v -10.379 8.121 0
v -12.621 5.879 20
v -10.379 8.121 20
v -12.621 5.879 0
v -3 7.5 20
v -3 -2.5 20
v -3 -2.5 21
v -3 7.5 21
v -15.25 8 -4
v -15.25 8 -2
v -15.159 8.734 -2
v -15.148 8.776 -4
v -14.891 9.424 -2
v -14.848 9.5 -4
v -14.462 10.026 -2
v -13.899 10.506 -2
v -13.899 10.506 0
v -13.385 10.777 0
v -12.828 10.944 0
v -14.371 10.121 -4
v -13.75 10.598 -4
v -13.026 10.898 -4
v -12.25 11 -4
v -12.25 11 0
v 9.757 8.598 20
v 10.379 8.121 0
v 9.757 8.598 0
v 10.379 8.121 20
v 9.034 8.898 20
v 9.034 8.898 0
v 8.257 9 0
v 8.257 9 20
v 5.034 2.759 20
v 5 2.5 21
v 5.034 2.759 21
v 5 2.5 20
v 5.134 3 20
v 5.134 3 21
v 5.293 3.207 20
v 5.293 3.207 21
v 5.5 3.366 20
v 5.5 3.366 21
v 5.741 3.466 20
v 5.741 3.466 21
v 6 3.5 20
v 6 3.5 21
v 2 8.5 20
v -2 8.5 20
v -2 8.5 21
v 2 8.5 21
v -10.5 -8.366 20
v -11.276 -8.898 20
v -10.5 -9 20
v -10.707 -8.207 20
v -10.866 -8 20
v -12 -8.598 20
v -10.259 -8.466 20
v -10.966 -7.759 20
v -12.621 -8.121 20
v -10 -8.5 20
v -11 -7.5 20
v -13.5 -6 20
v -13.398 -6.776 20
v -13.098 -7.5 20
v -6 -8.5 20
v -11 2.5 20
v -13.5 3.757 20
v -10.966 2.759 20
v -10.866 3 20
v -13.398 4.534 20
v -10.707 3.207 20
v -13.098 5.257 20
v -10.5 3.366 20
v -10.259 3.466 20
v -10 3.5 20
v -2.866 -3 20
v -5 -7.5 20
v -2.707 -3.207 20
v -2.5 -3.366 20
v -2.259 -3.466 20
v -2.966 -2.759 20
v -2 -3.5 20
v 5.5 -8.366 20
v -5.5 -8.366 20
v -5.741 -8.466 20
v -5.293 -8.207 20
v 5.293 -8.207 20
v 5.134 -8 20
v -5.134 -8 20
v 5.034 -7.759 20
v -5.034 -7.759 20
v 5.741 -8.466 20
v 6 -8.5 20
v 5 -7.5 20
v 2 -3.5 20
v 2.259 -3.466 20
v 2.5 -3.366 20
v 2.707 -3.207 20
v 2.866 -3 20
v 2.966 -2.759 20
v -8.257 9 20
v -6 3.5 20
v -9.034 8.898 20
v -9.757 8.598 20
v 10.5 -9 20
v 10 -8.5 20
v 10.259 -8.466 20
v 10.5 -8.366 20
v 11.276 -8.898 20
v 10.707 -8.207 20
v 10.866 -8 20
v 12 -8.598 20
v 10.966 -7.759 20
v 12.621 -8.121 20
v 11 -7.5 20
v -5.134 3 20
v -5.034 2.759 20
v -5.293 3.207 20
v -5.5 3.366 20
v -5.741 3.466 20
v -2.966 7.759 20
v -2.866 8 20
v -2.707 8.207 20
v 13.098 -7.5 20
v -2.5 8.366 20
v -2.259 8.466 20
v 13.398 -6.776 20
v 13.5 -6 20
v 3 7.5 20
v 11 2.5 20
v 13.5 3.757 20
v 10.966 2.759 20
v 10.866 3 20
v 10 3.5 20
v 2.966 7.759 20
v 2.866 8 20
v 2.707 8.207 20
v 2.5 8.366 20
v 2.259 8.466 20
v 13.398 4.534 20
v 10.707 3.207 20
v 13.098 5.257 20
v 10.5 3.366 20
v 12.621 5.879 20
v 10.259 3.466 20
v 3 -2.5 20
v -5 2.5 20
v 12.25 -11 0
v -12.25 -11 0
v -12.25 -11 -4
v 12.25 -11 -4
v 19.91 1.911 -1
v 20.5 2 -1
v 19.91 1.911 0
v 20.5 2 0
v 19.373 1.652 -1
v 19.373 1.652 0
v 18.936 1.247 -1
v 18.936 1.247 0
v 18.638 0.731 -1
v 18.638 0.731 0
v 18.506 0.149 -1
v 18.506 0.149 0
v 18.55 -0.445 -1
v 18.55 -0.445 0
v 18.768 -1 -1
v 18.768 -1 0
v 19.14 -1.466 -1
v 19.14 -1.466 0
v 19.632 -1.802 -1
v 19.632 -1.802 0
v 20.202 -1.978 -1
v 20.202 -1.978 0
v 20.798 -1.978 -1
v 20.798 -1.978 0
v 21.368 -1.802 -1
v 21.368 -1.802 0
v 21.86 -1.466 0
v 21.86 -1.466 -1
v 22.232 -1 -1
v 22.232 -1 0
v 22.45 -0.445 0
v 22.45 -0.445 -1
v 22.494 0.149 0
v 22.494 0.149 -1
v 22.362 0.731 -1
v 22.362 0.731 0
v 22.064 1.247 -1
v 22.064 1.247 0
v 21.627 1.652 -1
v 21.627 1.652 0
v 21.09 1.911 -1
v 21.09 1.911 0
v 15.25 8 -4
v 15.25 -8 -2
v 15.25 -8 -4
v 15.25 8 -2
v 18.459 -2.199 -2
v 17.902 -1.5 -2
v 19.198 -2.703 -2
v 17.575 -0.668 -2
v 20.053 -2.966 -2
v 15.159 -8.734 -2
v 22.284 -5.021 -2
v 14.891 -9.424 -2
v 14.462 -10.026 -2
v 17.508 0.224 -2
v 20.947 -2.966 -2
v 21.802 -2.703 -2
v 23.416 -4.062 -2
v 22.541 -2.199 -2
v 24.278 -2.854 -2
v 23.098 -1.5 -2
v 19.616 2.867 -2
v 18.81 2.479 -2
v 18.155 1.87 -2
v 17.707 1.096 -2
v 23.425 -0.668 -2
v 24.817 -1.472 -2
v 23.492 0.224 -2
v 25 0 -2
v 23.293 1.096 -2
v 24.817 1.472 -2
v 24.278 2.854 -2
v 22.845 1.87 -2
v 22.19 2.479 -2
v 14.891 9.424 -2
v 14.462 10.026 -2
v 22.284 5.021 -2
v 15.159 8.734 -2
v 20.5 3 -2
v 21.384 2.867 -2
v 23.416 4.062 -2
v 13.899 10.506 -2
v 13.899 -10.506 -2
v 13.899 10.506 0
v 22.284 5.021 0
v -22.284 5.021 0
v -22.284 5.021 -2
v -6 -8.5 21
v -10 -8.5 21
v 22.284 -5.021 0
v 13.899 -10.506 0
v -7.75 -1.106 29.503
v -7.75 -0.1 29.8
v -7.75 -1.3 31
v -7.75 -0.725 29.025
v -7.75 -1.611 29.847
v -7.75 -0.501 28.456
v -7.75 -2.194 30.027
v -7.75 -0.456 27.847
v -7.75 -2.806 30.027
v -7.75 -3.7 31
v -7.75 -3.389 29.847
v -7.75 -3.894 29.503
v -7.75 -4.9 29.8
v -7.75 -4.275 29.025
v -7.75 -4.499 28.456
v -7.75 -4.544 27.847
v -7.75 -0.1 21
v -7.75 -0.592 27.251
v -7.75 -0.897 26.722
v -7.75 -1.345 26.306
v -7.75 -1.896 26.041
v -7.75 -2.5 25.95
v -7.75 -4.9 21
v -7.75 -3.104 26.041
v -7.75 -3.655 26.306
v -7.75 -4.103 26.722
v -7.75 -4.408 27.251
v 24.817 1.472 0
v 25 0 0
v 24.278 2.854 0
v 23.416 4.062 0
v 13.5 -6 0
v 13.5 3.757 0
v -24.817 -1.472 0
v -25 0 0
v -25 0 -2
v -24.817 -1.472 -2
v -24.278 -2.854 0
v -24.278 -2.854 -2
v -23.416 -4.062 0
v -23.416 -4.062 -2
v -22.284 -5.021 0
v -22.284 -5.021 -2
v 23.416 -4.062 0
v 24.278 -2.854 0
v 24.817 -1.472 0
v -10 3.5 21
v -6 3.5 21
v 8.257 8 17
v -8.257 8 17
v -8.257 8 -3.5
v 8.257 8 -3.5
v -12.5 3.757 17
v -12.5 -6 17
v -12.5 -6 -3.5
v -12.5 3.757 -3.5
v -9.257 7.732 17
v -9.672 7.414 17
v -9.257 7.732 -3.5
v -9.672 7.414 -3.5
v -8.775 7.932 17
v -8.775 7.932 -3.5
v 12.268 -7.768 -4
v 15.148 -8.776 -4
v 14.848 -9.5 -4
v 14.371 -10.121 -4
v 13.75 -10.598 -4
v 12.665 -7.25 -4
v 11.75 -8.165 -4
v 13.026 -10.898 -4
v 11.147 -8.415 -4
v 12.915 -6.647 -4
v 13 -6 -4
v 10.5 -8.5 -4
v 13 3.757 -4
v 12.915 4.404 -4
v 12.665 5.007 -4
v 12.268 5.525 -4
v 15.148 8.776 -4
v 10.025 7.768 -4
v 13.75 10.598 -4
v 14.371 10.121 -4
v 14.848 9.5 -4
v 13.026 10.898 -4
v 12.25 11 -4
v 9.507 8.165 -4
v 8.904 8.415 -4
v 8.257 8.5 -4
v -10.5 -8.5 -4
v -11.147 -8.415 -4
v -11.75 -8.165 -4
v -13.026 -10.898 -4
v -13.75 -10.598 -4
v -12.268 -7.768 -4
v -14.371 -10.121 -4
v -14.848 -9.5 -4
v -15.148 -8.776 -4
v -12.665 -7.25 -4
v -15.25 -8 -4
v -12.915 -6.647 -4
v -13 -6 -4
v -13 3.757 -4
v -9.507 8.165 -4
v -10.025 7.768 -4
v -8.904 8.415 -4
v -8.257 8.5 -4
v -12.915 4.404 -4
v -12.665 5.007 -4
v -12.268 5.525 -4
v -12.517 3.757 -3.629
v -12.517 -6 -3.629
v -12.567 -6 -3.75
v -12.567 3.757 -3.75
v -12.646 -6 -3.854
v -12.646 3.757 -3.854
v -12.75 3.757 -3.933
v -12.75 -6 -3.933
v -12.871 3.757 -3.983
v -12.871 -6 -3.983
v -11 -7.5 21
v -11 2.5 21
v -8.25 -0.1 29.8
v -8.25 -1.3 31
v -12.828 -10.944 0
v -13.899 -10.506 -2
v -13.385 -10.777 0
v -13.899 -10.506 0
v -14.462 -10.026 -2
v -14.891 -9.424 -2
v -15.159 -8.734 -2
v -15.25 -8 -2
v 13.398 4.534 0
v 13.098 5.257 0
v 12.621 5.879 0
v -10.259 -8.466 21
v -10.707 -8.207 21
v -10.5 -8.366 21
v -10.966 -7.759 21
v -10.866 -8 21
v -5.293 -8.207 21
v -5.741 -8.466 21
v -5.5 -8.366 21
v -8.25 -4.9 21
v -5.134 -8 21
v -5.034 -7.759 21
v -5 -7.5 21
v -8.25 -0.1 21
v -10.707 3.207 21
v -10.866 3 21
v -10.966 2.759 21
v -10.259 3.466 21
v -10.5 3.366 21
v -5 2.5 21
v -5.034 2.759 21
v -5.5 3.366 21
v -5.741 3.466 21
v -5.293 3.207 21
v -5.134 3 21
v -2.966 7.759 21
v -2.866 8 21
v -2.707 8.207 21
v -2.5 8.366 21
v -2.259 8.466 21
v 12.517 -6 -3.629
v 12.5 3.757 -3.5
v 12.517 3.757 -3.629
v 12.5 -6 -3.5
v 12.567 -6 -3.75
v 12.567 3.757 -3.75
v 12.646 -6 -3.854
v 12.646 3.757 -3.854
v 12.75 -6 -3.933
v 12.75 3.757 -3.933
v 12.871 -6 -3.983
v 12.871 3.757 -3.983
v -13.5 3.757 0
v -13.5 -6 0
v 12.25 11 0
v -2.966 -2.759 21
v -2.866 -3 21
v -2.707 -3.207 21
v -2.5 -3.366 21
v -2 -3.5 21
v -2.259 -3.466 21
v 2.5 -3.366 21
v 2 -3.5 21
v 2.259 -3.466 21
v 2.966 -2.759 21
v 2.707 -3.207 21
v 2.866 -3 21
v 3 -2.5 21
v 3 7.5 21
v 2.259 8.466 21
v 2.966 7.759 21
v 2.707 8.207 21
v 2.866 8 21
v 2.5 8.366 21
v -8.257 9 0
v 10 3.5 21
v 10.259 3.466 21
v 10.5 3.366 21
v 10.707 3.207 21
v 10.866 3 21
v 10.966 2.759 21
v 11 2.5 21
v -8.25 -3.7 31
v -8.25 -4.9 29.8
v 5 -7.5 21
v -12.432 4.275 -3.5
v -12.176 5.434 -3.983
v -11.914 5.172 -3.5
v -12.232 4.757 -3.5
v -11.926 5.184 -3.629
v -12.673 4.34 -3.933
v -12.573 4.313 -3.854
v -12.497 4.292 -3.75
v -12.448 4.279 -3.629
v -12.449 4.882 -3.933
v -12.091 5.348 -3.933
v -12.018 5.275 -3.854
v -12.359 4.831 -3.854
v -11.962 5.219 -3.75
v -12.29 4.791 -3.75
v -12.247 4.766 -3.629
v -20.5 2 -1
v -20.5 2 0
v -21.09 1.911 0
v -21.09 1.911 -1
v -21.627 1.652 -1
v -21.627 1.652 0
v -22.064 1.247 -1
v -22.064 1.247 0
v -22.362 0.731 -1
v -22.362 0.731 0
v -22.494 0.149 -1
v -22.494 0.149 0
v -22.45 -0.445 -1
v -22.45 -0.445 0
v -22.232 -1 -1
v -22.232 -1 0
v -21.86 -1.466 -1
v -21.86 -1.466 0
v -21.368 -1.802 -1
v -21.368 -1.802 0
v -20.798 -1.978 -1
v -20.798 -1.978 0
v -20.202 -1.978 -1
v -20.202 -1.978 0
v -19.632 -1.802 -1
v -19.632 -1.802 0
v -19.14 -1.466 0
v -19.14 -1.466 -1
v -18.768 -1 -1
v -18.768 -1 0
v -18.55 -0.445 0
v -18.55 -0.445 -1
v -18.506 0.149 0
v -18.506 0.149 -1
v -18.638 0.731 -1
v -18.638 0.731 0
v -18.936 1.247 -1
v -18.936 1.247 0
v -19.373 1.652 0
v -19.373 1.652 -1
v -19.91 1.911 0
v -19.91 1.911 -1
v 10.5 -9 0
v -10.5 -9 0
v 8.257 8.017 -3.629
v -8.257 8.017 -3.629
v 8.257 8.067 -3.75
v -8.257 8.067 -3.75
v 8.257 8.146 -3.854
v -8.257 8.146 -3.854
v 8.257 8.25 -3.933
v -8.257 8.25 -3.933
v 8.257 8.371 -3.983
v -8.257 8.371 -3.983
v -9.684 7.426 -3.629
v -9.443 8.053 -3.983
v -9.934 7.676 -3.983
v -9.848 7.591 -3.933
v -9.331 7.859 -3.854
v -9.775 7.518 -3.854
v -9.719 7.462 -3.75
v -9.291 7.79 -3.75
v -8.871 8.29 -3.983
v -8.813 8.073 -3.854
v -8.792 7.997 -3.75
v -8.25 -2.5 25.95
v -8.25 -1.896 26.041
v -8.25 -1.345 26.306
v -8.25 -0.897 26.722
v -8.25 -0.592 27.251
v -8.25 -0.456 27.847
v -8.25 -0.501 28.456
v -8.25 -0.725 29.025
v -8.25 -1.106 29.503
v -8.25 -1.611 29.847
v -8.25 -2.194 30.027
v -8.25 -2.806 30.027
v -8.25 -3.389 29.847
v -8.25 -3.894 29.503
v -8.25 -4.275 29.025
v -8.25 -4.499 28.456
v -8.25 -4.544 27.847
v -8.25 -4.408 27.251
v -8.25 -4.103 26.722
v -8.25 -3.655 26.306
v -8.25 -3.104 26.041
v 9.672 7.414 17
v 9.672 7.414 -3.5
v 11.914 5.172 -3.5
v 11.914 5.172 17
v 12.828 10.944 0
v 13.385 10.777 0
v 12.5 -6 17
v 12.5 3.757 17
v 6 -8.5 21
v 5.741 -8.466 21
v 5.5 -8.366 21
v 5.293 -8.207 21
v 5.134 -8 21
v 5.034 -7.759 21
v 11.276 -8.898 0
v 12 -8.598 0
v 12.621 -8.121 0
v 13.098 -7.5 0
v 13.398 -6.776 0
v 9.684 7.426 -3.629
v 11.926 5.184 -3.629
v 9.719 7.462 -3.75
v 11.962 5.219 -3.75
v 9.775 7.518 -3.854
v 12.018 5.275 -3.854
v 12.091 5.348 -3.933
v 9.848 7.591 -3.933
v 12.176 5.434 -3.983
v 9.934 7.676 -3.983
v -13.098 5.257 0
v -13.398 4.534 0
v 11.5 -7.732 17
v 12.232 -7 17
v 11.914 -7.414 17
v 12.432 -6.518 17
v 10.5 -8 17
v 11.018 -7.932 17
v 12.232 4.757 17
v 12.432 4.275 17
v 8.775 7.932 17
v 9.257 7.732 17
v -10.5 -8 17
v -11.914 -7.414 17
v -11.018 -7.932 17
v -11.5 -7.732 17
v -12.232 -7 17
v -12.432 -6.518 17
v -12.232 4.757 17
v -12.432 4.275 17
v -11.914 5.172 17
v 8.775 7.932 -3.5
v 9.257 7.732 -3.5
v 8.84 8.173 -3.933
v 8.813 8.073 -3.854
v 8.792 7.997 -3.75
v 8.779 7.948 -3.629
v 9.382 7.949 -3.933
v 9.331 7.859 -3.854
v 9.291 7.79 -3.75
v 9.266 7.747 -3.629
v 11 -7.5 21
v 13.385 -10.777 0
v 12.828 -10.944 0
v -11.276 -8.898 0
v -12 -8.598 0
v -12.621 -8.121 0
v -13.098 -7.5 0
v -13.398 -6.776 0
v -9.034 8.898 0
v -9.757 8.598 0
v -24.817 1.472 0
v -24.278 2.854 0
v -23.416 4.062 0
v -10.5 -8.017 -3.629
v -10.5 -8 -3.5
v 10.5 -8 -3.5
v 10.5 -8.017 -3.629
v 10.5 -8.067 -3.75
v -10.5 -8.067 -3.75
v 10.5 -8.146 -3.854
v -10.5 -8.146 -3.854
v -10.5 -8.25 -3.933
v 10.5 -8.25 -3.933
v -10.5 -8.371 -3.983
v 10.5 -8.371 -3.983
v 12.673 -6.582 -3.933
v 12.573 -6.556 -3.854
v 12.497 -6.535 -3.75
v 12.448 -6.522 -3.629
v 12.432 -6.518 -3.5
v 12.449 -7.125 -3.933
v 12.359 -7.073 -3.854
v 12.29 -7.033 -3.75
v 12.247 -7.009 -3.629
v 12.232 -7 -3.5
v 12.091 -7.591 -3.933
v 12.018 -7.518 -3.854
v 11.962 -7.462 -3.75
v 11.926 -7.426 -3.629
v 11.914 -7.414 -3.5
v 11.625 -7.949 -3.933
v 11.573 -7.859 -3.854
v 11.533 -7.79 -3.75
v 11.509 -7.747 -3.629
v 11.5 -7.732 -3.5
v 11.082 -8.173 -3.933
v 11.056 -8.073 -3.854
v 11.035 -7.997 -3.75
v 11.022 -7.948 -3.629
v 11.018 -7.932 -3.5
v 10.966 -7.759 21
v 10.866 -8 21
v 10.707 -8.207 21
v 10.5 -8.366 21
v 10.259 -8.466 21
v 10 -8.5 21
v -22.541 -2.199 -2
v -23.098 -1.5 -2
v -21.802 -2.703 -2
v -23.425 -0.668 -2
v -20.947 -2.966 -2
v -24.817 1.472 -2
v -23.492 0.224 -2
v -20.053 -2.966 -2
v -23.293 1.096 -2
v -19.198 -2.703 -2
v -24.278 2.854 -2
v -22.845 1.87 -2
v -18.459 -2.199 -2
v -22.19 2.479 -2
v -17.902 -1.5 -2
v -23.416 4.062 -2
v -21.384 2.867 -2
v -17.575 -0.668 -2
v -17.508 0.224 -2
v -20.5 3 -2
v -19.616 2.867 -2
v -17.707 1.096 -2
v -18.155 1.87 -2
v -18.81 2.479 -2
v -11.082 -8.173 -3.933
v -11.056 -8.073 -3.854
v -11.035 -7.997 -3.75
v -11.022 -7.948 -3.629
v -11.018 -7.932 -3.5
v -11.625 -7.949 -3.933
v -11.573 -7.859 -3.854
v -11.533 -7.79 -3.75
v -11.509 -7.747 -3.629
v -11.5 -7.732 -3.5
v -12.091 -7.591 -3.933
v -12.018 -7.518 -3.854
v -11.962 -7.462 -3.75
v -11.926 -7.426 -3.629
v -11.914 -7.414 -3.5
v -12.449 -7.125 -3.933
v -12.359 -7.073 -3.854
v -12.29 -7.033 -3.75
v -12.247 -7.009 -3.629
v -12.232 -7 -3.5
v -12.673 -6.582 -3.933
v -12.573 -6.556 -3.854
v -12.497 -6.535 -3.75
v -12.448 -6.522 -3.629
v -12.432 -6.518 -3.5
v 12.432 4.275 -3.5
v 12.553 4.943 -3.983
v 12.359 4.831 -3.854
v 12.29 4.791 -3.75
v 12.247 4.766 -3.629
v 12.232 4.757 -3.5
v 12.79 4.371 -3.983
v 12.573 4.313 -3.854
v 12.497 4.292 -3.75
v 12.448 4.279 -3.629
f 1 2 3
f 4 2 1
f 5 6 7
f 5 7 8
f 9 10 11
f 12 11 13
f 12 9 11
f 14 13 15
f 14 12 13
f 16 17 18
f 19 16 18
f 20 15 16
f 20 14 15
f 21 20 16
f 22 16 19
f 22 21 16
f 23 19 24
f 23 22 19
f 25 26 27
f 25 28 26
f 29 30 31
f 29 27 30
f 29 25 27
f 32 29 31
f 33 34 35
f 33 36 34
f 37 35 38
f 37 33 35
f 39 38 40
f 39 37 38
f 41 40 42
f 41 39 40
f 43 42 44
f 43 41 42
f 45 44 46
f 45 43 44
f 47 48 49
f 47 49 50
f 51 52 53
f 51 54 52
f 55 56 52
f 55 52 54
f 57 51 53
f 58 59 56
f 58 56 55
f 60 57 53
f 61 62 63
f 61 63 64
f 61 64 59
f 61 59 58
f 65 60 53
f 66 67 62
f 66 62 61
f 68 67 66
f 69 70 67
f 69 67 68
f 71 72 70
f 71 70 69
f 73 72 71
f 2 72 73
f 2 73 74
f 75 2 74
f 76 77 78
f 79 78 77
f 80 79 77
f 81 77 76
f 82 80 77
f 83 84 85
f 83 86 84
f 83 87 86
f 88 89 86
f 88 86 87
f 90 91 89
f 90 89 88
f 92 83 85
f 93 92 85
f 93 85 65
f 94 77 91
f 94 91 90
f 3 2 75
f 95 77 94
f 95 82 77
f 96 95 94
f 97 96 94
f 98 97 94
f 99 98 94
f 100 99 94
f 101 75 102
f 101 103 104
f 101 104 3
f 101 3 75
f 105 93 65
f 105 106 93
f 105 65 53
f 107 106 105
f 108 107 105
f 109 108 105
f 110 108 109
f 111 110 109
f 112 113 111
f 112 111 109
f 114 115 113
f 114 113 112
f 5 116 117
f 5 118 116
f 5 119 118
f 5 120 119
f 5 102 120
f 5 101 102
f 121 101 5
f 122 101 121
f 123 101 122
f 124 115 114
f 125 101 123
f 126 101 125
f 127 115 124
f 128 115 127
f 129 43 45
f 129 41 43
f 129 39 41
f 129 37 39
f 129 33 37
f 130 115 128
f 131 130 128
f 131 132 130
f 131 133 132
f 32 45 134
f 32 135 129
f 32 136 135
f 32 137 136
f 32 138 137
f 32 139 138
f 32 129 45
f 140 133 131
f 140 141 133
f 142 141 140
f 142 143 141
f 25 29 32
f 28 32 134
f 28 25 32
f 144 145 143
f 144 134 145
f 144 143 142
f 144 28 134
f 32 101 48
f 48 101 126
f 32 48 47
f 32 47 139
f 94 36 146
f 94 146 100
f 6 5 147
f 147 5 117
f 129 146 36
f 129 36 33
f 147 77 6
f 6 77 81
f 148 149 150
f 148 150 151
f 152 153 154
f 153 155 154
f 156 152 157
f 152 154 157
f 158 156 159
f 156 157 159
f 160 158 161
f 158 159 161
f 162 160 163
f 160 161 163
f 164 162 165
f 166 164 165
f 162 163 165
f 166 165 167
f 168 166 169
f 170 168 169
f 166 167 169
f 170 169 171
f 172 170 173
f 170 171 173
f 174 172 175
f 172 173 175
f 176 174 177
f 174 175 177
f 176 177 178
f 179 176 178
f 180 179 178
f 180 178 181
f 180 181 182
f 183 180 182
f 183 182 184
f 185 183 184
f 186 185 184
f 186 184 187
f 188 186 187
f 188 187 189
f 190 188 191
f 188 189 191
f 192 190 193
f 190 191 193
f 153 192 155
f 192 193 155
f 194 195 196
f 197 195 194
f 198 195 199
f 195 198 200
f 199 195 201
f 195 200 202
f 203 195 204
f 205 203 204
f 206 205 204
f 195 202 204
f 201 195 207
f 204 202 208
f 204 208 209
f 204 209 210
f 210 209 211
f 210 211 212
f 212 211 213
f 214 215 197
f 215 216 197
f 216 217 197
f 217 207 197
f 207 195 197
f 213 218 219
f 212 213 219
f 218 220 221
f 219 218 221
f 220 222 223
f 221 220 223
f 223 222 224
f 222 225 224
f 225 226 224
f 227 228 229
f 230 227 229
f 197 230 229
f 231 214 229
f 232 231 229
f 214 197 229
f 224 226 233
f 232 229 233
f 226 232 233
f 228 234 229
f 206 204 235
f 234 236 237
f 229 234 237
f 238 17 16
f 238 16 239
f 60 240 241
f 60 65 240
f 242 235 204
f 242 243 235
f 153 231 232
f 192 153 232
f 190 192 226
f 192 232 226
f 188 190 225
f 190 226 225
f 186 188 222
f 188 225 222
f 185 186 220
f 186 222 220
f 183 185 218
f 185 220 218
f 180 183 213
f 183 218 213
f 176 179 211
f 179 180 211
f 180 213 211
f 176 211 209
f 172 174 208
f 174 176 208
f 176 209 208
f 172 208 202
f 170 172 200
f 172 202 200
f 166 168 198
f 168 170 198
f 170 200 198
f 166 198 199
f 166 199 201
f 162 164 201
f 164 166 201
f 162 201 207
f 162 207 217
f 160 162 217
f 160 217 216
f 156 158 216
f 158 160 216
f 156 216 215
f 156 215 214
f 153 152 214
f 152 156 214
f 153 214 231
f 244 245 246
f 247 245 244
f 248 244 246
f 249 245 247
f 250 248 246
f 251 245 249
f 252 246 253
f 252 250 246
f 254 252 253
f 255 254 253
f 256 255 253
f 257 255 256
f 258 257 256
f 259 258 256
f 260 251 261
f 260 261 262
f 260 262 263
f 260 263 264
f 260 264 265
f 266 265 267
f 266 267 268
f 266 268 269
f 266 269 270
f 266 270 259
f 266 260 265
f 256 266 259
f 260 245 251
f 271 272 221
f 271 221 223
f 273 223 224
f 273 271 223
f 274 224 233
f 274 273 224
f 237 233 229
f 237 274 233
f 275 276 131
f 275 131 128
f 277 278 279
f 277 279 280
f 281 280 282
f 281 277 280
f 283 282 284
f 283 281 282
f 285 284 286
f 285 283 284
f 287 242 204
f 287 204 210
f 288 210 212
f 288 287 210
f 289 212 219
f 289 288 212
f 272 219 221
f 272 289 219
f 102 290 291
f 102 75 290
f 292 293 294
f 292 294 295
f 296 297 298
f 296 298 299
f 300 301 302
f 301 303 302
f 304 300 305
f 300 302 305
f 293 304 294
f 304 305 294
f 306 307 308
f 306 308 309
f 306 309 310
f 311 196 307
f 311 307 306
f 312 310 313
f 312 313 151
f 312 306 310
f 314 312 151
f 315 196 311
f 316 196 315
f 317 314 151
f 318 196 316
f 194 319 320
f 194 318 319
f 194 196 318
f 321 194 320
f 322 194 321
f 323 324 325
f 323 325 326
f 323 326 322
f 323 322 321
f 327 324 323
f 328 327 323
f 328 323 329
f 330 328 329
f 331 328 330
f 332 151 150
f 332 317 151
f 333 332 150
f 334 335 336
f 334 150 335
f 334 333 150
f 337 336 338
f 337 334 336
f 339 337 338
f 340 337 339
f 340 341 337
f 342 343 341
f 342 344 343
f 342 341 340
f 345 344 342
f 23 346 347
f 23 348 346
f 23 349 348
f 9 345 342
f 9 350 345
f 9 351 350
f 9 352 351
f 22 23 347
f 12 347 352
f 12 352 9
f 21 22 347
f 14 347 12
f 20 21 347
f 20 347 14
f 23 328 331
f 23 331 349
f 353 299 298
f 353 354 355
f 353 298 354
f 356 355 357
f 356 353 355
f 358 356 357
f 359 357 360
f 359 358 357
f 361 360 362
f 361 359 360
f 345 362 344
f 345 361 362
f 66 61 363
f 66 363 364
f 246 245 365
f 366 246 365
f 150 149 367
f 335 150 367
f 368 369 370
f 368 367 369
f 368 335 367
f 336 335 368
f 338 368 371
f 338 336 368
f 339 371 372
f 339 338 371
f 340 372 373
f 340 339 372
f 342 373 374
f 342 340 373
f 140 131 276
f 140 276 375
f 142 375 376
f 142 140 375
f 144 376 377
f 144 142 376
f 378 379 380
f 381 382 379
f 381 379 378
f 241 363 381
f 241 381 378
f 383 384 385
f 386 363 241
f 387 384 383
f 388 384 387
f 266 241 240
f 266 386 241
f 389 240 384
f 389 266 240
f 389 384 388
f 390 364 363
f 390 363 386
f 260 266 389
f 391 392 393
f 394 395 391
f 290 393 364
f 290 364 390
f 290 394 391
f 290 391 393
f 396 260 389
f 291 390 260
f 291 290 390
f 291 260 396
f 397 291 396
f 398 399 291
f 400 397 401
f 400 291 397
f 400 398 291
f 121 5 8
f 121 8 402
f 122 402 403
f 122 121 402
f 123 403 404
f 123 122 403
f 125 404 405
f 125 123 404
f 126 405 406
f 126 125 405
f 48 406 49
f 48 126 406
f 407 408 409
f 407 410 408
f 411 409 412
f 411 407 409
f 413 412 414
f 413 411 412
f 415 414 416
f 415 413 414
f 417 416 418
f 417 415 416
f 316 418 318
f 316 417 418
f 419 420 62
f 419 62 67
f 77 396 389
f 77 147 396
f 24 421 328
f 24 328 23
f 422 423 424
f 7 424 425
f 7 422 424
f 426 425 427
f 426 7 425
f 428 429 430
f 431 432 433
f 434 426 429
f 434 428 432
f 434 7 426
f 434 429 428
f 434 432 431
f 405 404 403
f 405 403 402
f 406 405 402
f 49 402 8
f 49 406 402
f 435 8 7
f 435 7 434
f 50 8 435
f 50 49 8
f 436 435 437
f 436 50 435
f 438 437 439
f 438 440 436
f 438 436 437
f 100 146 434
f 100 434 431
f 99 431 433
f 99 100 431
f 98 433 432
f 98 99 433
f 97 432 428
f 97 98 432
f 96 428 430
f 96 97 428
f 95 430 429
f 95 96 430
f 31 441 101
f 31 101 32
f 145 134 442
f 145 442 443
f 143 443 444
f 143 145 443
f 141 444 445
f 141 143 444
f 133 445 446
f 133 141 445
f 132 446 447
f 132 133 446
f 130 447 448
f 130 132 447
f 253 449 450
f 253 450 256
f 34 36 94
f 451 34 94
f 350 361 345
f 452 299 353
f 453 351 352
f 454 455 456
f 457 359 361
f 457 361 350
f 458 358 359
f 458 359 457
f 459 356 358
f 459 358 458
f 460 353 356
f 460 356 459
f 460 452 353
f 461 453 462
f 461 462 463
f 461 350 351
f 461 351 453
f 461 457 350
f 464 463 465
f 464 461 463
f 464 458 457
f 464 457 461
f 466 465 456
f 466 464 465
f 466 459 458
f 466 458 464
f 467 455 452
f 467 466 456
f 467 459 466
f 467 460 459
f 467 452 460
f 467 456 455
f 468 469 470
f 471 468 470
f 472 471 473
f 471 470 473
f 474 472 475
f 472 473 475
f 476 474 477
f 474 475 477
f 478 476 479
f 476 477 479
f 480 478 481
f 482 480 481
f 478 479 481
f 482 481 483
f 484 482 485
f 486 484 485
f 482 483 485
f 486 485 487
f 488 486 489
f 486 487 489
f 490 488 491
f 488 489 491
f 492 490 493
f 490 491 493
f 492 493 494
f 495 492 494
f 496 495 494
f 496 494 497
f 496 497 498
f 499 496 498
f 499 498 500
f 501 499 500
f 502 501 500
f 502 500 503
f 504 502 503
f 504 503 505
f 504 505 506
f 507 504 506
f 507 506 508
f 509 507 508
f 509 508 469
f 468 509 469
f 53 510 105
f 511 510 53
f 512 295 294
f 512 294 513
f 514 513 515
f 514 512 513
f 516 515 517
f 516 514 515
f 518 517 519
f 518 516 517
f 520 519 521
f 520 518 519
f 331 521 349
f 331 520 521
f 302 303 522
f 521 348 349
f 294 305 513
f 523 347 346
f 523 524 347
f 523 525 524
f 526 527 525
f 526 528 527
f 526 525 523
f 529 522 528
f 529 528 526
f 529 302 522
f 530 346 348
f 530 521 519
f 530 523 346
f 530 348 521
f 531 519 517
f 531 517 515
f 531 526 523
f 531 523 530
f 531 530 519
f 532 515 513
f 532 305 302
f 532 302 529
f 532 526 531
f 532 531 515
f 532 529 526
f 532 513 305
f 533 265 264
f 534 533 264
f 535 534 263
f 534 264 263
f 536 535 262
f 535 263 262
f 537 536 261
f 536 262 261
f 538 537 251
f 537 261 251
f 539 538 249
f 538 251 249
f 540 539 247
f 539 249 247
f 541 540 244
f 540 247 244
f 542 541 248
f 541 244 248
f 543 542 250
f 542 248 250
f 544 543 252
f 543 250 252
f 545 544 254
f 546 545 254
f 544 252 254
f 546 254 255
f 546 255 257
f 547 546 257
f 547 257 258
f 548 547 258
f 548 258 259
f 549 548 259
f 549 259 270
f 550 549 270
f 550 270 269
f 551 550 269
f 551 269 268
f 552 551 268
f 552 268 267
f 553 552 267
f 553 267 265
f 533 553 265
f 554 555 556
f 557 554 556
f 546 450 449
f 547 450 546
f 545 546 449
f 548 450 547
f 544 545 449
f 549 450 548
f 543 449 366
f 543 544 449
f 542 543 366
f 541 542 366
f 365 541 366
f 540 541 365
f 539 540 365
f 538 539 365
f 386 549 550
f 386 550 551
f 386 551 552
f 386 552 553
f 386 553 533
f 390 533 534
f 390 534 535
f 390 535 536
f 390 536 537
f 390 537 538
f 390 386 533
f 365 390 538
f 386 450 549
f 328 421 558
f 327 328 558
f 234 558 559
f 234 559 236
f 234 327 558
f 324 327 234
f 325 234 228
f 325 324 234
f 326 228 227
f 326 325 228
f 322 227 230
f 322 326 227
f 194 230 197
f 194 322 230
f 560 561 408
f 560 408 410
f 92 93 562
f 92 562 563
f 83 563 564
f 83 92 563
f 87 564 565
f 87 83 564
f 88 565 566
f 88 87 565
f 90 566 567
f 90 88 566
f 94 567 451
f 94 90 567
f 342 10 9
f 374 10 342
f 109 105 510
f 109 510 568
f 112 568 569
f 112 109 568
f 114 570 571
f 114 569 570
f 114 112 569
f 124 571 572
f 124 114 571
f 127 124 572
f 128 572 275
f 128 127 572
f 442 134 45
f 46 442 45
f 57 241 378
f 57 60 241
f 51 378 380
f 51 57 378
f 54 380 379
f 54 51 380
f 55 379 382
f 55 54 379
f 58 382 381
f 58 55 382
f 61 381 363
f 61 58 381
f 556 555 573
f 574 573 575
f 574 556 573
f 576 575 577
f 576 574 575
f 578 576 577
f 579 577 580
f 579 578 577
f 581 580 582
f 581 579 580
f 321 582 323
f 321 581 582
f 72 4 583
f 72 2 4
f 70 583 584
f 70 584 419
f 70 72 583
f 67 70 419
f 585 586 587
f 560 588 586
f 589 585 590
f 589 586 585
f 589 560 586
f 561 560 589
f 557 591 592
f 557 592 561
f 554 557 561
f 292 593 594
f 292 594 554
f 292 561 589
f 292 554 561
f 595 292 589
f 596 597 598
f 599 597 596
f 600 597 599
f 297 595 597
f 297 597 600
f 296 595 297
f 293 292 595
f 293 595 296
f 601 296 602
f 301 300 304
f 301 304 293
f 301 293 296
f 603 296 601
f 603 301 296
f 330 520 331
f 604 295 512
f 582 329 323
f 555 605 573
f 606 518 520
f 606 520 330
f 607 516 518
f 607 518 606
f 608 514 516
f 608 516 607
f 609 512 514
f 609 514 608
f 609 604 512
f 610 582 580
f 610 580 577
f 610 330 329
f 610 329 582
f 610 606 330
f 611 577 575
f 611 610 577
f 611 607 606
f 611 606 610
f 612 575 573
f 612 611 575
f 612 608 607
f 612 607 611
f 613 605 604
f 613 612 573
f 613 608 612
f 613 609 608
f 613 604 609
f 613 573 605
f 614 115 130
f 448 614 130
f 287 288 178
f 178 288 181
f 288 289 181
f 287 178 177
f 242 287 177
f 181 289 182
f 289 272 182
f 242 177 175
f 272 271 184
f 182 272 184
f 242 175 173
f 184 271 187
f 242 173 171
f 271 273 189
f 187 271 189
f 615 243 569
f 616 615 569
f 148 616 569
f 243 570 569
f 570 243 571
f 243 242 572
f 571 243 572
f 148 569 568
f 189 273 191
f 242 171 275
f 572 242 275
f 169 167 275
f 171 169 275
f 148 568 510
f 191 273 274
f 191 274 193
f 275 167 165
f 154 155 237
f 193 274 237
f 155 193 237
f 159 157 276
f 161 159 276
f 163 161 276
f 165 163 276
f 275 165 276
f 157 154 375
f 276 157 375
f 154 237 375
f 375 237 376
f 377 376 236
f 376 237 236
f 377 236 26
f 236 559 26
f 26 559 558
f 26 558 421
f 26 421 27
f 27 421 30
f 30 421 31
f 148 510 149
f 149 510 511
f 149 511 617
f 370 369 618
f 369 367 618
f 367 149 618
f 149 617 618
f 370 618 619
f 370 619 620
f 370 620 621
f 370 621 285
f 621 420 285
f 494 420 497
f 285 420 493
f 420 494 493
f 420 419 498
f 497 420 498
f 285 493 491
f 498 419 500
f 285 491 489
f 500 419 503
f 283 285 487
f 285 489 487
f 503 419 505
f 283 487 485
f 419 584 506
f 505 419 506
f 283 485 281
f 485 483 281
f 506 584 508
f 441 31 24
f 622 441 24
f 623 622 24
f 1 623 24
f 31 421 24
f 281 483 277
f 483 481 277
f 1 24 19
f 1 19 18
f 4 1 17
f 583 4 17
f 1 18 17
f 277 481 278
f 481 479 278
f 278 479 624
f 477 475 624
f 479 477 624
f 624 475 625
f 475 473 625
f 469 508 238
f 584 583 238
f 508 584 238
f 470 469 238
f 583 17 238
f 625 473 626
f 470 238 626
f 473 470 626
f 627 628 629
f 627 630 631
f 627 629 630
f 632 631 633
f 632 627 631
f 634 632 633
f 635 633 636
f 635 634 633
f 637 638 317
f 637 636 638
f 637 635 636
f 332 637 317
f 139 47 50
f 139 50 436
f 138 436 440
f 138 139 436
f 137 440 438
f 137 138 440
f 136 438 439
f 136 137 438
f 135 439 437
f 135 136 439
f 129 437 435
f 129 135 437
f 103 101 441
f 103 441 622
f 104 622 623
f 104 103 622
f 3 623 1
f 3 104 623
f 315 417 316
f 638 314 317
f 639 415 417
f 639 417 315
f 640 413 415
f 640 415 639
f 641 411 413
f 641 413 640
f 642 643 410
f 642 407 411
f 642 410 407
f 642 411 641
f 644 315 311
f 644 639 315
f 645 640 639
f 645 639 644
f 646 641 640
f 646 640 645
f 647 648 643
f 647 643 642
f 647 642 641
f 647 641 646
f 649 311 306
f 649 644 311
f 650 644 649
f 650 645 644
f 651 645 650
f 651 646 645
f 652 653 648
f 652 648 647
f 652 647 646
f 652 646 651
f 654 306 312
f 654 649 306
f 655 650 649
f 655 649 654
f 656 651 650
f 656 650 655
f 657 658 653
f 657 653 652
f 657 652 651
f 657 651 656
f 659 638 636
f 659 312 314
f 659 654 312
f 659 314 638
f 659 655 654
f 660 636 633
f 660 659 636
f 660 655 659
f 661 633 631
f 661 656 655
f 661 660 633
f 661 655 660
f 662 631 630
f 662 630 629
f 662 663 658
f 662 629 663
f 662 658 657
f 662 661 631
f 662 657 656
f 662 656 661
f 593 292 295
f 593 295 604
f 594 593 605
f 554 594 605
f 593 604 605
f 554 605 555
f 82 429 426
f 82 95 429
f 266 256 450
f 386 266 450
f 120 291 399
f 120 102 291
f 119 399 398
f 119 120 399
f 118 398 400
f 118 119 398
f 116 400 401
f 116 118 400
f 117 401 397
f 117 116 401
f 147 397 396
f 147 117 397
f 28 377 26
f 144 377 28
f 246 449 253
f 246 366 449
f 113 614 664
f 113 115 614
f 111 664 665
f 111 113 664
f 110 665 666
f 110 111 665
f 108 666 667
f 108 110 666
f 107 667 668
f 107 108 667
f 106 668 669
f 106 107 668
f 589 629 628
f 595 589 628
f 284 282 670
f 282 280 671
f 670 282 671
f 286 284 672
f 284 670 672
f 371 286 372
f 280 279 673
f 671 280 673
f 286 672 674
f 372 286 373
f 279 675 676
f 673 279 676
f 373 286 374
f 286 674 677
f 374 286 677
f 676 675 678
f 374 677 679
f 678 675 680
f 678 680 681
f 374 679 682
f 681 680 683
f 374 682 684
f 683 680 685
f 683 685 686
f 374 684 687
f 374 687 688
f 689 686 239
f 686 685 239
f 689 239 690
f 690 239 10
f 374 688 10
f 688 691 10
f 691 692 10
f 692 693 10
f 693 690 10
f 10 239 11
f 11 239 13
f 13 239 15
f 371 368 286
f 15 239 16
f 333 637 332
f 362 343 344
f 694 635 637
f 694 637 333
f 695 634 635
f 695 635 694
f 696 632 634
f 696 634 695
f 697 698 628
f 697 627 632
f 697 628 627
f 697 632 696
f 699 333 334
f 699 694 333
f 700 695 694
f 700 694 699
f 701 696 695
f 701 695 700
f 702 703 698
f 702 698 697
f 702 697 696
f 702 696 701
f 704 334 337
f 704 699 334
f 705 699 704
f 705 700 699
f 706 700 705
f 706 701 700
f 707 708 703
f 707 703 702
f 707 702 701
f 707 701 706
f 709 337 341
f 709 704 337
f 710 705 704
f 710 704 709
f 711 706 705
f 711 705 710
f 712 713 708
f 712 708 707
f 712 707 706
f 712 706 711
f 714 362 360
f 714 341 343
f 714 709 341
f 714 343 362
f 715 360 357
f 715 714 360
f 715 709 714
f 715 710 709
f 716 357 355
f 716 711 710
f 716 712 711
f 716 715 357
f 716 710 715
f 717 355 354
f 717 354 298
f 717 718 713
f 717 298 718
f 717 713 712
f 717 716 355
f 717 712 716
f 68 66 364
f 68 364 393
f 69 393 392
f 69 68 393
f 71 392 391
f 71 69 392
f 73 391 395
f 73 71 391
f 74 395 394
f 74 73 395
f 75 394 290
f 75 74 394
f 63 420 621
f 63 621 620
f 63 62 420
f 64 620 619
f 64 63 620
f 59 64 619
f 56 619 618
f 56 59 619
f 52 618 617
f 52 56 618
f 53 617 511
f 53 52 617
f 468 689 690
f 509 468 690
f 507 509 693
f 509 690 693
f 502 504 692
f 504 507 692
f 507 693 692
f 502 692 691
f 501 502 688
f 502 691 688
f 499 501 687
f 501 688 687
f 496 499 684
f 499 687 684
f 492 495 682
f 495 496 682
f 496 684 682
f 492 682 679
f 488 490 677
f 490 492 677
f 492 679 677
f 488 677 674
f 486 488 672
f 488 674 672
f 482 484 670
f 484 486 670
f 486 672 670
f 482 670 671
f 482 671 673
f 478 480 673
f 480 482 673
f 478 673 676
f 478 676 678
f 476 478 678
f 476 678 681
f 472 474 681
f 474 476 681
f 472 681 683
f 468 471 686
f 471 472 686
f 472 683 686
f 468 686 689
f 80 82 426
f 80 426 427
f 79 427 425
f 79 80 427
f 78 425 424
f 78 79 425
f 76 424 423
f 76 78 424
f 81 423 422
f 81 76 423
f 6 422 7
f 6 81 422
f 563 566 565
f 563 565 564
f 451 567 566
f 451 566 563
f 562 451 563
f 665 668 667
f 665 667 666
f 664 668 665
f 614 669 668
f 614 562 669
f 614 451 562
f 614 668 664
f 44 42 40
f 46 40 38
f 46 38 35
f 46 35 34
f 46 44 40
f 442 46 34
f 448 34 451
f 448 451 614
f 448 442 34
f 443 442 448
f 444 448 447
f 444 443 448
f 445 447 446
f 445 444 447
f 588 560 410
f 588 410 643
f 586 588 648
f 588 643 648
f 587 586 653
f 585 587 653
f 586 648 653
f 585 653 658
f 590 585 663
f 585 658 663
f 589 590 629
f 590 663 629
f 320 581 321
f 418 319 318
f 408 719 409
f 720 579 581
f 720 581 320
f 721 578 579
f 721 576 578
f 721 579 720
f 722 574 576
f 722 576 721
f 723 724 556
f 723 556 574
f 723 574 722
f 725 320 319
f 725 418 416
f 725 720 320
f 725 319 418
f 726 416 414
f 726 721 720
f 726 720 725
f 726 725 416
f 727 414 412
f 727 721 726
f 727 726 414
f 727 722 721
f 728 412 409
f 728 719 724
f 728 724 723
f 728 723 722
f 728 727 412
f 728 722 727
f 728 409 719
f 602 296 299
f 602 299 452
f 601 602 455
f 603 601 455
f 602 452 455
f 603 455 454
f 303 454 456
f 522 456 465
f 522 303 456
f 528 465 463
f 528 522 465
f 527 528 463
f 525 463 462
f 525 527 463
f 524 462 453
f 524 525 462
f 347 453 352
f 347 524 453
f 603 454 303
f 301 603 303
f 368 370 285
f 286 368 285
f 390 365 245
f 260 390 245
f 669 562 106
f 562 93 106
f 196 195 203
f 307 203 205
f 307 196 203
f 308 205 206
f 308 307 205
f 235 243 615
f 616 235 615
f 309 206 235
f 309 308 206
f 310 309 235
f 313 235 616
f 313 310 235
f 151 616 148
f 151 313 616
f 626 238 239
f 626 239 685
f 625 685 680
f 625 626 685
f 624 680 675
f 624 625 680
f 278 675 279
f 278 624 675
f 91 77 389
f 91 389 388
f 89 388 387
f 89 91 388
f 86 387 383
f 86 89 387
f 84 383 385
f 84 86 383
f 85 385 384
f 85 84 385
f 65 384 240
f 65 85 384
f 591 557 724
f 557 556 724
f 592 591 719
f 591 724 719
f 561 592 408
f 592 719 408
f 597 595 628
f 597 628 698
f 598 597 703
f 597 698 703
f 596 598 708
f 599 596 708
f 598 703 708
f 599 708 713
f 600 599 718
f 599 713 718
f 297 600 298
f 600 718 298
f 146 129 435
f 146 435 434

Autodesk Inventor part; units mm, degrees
ref_plane "YZ Plane" through (0, 0, 0) normal (1, 0, 0) x (0, 1, 0)
ref_plane "XZ Plane" through (0, 0, 0) normal (0, 1, 0) x (-1, 0, 0)
ref_plane "XY Plane" through (0, 0, 0) normal (0, 0, 1) x (1, 0, 0)
sketch "Sketch1" plane through (0, 0, 0) normal (0, 0, 1) x (1, 0, 0)
  line L0 (-13.5, 9) -> (13.5, 9)
  line L1 (13.5, 9) -> (13.5, -9)
  line L2 (13.5, -9) -> (-13.5, -9)
  line L3 (-13.5, -9) -> (-13.5, 9)
  line L4 (-13.5, 9) -> (13.5, -9) construction
  line L5 (13.5, 9) -> (-13.5, -9) construction
  point P0 (0, 0)
  dimension "c14_inside_outer_width" = 27
  dimension "c14_inside_outer_height" = 18
extrude "Extrusion1" add sketch "Sketch1" along normal blind 20
chamfer "Chamfer1" distance 4 angle 45 2 edges at (-13.5, 9, 10) (13.5, 9, 10)
sketch "Sketch2" plane through (0, 0, 20) normal (0, 0, 1) x (1, 0, 0)
  line L0 (-2, 8.5) -> (2, 8.5)
  line L1 (3, 7.5) -> (3, -2.5)
  line L2 (2, -3.5) -> (-2, -3.5)
  line L3 (-3, -2.5) -> (-3, 7.5)
  line L4 (-3, 8.5) -> (3, -3.5) construction
  line L5 (3, 8.5) -> (-3, -3.5) construction
  line L6 (9.5, 9) -> (-9.5, 9) construction
  line L7 (0, 9) -> (0, -9)
  line L8 (-13.5, -9) -> (13.5, -9) construction
  arc A0 (-2, 8.5) -> (-3, 7.5) centre (-2, 7.5) ccw
  arc A1 (3, 7.5) -> (2, 8.5) centre (2, 7.5) ccw
  arc A2 (2, -3.5) -> (3, -2.5) centre (2, -2.5) ccw
  arc A3 (-3, -2.5) -> (-2, -3.5) centre (-2, -2.5) ccw
  line L9 (-10, 3.5) -> (-6, 3.5)
  line L10 (-5, 2.5) -> (-5, -7.5)
  line L11 (-6, -8.5) -> (-10, -8.5)
  line L12 (-11, -7.5) -> (-11, 2.5)
  line L13 (-11, 3.5) -> (-5, -8.5) construction
  line L14 (-5, 3.5) -> (-11, -8.5) construction
  arc A4 (-10, 3.5) -> (-11, 2.5) centre (-10, 2.5) ccw
  arc A5 (-5, 2.5) -> (-6, 3.5) centre (-6, 2.5) ccw
  arc A6 (-6, -8.5) -> (-5, -7.5) centre (-6, -7.5) ccw
  arc A7 (-11, -7.5) -> (-10, -8.5) centre (-10, -7.5) ccw
  line L15 (6, -8.5) -> (10, -8.5)
  arc A8 (10, -8.5) -> (11, -7.5) centre (10, -7.5) ccw
  line L16 (5, 2.5) -> (5, -7.5)
  line L17 (11, -7.5) -> (11, 2.5)
  line L18 (11, 3.5) -> (5, -8.5) construction
  line L19 (5, 3.5) -> (11, -8.5) construction
  arc A9 (6, 3.5) -> (5, 2.5) centre (6, 2.5) ccw
  line L20 (10, 3.5) -> (6, 3.5)
  arc A10 (11, 2.5) -> (10, 3.5) centre (10, 2.5) ccw
  arc A11 (5, -7.5) -> (6, -8.5) centre (6, -7.5) ccw
  point P0 (0, 0)
  point P1 (0, 2.5)
  point P2 (-8, -2.5)
  point P3 (8, -2.5)
  dimension "d7" = 6
  dimension "d8" = 12
  dimension "d9" = 0.5
  dimension "d10" = 1
  dimension "d11" = 6
  dimension "d12" = 12
  dimension "d13" = 1
  dimension "d14" = 0.5
  dimension "d15" = 2
extrude "Extrusion2" add sketch "Sketch2" along normal blind 1
sketch "Sketch3" plane through (0, 0, 0) normal (0, 0, -1) x (-1, 0, 0)
  line L0 (-13.5, 5) -> (-9.5, 9) construction
  line L1 (-13.5, -9) -> (-13.5, 5) construction
  line L2 (13.5, -9) -> (-13.5, -9) construction
  line L3 (13.5, 5) -> (13.5, -9) construction
  line L4 (9.5, 9) -> (13.5, 5) construction
  line L5 (-9.5, 9) -> (9.5, 9) construction
  line L6 (0, 9) -> (0, -9)
  line L7 (-15.25, 11) -> (15.25, 11)
  line L8 (15.25, 11) -> (15.25, -11)
  line L9 (15.25, -11) -> (-15.25, -11)
  line L10 (-15.25, -11) -> (-15.25, 11)
  line L11 (-15.25, 11) -> (15.25, -11) construction
  line L12 (15.25, 11) -> (-15.25, -11) construction
  line L13 (-13.5, -9) -> (-13.5, 9) construction
  line L14 (-13.5, 0) -> (13.5, 0) construction
  point P0 (0, 0)
  point P1 (0, 0)
  dimension "c14_outer_width_1" = 30.5
  dimension "c14_outer_height" = 22
extrude "Extrusion3" add sketch "Sketch3" along normal blind 4
fillet "Fillet1" radius 3 4 edges at (-15.25, 11, -2) (-15.25, -11, -2) (15.25, -11, -2) (15.25, 11, -2)
sketch "Sketch5" plane through (0, 0, 0) normal (0, 0, 1) x (1, 0, 0)
  line L0 (-12.25, 11) -> (12.25, 11) projected
  arc A0 (-12.25, 11) -> (-15.25, 8) centre (-12.25, 8) ccw construction
  line L1 (-15.25, -8) -> (-15.25, 8) construction
  arc A1 (-15.25, -8) -> (-12.25, -11) centre (-12.25, -8) ccw construction
  line L2 (12.25, -11) -> (-12.25, -11) projected
  arc A2 (12.25, -11) -> (15.25, -8) centre (12.25, -8) ccw construction
  line L3 (15.25, 8) -> (15.25, -8) construction
  arc A3 (15.25, 8) -> (12.25, 11) centre (12.25, 8) ccw construction
  line L4 (0, 11) -> (0, -11)
  arc A4 (-12.25, 11) -> (-13.8922, 10.5106) centre (-12.25, 8) ccw
  line L5 (-13.8922, 10.5106) -> (-22.2844, 5.0212)
  line L6 (-15.25, 0) -> (15.25, 0)
  arc A5 (-22.2844, 5.0212) -> (-25, 0) centre (-19, 0) ccw
  line L7 (-15.25, 0) -> (-70.2247, 0)
  arc A6 (-13.8922, -10.5106) -> (-12.25, -11) centre (-12.25, -8) ccw
  line L8 (-13.8922, -10.5106) -> (-22.2844, -5.0212)
  arc A7 (-25, 0) -> (-22.2844, -5.0212) centre (-19, 0) ccw
  arc A8 (13.8922, 10.5106) -> (12.25, 11) centre (12.25, 8) ccw
  line L9 (13.8922, 10.5106) -> (22.2844, 5.0212)
  arc A9 (25, 0) -> (22.2844, 5.0212) centre (19, 0) ccw
  arc A10 (12.25, -11) -> (13.8922, -10.5106) centre (12.25, -8) ccw
  line L10 (13.8922, -10.5106) -> (22.2844, -5.0212)
  arc A11 (22.2844, -5.0212) -> (25, 0) centre (19, 0) ccw
  point P0 (0, 0)
  dimension "d26" = 50
  dimension "d27" = 3
  dimension "d28" = 6
extrude "Extrusion5" add sketch "Sketch5" against normal blind 2
sketch "Sketch6" plane through (0, 0, -2) normal (0, 0, -1) x (-1, 0, 0)
  arc A0 (22.2844, -5.0212) -> (22.2844, 5.0212) centre (19, 0) ccw construction
  arc A1 (-22.2844, 5.0212) -> (-22.2844, -5.0212) centre (-19, 0) ccw construction
  line L0 (-25, 0) -> (25, 0) construction
  line L1 (0, 10) -> (0, -11) construction
  line L2 (-12.25, -11) -> (12.25, -11) construction
  point P0 (0, 0)
  point P1 (-20.5, 0)
  point P2 (20.5, 0)
  dimension "d55" = 41
hole "Hole1" at (20.5, 0, -2) at (-20.5, 0, -2) direction (0, 0, 1) diameter 4 end through all countersink diameter 6 countersink angle 90
fillet "Fillet3" radius 3 6 edges at (-13.5, 5, 10) (-9.5, 9, 10) (-13.5, -9, 10) (13.5, -9, 10) (13.5, 5, 10) (9.5, 9, 10)
sketch "Sketch7" plane through (0, 0, -4) normal (0, 0, -1) x (-1, 0, 0)
  line L0 (10.5, -9) -> (-10.5, -9) construction
  arc A0 (-13.5, -6) -> (-10.5, -9) centre (-10.5, -6) ccw construction
  line L1 (-13.5, -6) -> (-13.5, 3.7574) construction
  arc A1 (-12.6213, 5.8787) -> (-13.5, 3.7574) centre (-10.5, 3.7574) ccw construction
  line L2 (-10.3787, 8.1213) -> (-12.6213, 5.8787) construction
  arc A2 (-8.2574, 9) -> (-10.3787, 8.1213) centre (-8.2574, 6) ccw construction
  line L3 (-8.2574, 9) -> (8.2574, 9) construction
  arc A3 (10.3787, 8.1213) -> (8.2574, 9) centre (8.2574, 6) ccw construction
  line L4 (12.6213, 5.8787) -> (10.3787, 8.1213) construction
  arc A4 (13.5, 3.7574) -> (12.6213, 5.8787) centre (10.5, 3.7574) ccw construction
  line L5 (13.5, 3.7574) -> (13.5, -6) construction
  arc A5 (10.5, -9) -> (13.5, -6) centre (10.5, -6) ccw construction
  arc A6 (-11.9142, 5.1716) -> (-12.5, 3.7574) centre (-10.5, 3.7574) ccw
  line L6 (-12.5, 3.7574) -> (-12.5, -6)
  arc A7 (-12.5, -6) -> (-10.5, -8) centre (-10.5, -6) ccw
  line L7 (-10.5, -8) -> (10.5, -8)
  arc A8 (10.5, -8) -> (12.5, -6) centre (10.5, -6) ccw
  line L8 (12.5, -6) -> (12.5, 3.7574)
  arc A9 (12.5, 3.7574) -> (11.9142, 5.1716) centre (10.5, 3.7574) ccw
  line L9 (11.9142, 5.1716) -> (9.6716, 7.4142)
  arc A10 (9.6716, 7.4142) -> (8.2574, 8) centre (8.2574, 6) ccw
  line L10 (8.2574, 8) -> (-8.2574, 8)
  arc A11 (-8.2574, 8) -> (-9.6716, 7.4142) centre (-8.2574, 6) ccw
  line L11 (-9.6716, 7.4142) -> (-11.9142, 5.1716)
  point P0 (0, 0)
  dimension "d40" = 1
extrude "Extrusion6" cut sketch "Sketch7" against normal blind 21
fillet "Fillet4" radius 0.5 12 edges at (0, 8, -4) (-9.0227, 7.8478, -4) (-10.7929, 6.2929, -4) (-12.3478, 4.5227, -4) (-12.5, -1.1213, -4) (-11.9142, -7.4142, -4) (0, -8, -4) (11.9142, -7.4142, -4) (12.5, -1.1213, -4) (12.3478, 4.5227, -4) (10.7929, 6.2929, -4) (9.0227, 7.8478, -4)
sketch "Sketch8" plane through (0, 0, 21) normal (0, 0, 1) x (1, 0, 0)
  line L0 (-6, 3.5) -> (-10, 3.5) construction
  arc A0 (-10, 3.5) -> (-11, 2.5) centre (-10, 2.5) ccw construction
  line L1 (-11, 2.5) -> (-11, -7.5) construction
  arc A1 (-11, -7.5) -> (-10, -8.5) centre (-10, -7.5) ccw construction
  line L2 (-10, -8.5) -> (-6, -8.5) construction
  arc A2 (-6, -8.5) -> (-5, -7.5) centre (-6, -7.5) ccw construction
  line L3 (-5, -7.5) -> (-5, 2.5) construction
  arc A3 (-5, 2.5) -> (-6, 3.5) centre (-6, 2.5) ccw construction
  line L4 (-8, 3.5) -> (-8, -8.5)
  line L5 (-11, -2.5) -> (-5, -2.5)
  line L6 (-8.25, -0.1) -> (-7.75, -0.1)
  line L7 (-7.75, -0.1) -> (-7.75, -4.9)
  line L8 (-7.75, -4.9) -> (-8.25, -4.9)
  line L9 (-8.25, -4.9) -> (-8.25, -0.1)
  line L10 (-8.25, -0.1) -> (-7.75, -4.9) construction
  line L11 (-7.75, -0.1) -> (-8.25, -4.9) construction
  point P0 (0, 0)
  point P1 (-8, -2.5)
  dimension "d44" = 0.5
  dimension "d45" = 4.8
extrude "Extrusion7" add sketch "Sketch8" along normal blind 10
chamfer "Chamfer2" distance 1.2 angle 45 2 edges at (-8, -0.1, 31) (-8, -4.9, 31)
sketch "Sketch9" plane through (-7.75, -4.9, 21) normal (1, 0, 0) x (0, 0, -1)
  line L0 (-10, 1.2) -> (-10, 3.6) construction
  line L1 (-10, 2.4) -> (0.0273, 2.4)
  circle A0 centre (-7, 2.4) radius 2.05
  point P0 (21, 4.9)
  dimension "d51" = 4.1
  dimension "d52" = 3
extrude "Extrusion8" cut sketch "Sketch9" against normal blind 10
equation "\"d27\" = c14_outer_fillet"
equation "\"d39\" = c14_outer_fillet"
equation "\"c14_outer_fillet\" = 3"
properties part number "my_C14"
